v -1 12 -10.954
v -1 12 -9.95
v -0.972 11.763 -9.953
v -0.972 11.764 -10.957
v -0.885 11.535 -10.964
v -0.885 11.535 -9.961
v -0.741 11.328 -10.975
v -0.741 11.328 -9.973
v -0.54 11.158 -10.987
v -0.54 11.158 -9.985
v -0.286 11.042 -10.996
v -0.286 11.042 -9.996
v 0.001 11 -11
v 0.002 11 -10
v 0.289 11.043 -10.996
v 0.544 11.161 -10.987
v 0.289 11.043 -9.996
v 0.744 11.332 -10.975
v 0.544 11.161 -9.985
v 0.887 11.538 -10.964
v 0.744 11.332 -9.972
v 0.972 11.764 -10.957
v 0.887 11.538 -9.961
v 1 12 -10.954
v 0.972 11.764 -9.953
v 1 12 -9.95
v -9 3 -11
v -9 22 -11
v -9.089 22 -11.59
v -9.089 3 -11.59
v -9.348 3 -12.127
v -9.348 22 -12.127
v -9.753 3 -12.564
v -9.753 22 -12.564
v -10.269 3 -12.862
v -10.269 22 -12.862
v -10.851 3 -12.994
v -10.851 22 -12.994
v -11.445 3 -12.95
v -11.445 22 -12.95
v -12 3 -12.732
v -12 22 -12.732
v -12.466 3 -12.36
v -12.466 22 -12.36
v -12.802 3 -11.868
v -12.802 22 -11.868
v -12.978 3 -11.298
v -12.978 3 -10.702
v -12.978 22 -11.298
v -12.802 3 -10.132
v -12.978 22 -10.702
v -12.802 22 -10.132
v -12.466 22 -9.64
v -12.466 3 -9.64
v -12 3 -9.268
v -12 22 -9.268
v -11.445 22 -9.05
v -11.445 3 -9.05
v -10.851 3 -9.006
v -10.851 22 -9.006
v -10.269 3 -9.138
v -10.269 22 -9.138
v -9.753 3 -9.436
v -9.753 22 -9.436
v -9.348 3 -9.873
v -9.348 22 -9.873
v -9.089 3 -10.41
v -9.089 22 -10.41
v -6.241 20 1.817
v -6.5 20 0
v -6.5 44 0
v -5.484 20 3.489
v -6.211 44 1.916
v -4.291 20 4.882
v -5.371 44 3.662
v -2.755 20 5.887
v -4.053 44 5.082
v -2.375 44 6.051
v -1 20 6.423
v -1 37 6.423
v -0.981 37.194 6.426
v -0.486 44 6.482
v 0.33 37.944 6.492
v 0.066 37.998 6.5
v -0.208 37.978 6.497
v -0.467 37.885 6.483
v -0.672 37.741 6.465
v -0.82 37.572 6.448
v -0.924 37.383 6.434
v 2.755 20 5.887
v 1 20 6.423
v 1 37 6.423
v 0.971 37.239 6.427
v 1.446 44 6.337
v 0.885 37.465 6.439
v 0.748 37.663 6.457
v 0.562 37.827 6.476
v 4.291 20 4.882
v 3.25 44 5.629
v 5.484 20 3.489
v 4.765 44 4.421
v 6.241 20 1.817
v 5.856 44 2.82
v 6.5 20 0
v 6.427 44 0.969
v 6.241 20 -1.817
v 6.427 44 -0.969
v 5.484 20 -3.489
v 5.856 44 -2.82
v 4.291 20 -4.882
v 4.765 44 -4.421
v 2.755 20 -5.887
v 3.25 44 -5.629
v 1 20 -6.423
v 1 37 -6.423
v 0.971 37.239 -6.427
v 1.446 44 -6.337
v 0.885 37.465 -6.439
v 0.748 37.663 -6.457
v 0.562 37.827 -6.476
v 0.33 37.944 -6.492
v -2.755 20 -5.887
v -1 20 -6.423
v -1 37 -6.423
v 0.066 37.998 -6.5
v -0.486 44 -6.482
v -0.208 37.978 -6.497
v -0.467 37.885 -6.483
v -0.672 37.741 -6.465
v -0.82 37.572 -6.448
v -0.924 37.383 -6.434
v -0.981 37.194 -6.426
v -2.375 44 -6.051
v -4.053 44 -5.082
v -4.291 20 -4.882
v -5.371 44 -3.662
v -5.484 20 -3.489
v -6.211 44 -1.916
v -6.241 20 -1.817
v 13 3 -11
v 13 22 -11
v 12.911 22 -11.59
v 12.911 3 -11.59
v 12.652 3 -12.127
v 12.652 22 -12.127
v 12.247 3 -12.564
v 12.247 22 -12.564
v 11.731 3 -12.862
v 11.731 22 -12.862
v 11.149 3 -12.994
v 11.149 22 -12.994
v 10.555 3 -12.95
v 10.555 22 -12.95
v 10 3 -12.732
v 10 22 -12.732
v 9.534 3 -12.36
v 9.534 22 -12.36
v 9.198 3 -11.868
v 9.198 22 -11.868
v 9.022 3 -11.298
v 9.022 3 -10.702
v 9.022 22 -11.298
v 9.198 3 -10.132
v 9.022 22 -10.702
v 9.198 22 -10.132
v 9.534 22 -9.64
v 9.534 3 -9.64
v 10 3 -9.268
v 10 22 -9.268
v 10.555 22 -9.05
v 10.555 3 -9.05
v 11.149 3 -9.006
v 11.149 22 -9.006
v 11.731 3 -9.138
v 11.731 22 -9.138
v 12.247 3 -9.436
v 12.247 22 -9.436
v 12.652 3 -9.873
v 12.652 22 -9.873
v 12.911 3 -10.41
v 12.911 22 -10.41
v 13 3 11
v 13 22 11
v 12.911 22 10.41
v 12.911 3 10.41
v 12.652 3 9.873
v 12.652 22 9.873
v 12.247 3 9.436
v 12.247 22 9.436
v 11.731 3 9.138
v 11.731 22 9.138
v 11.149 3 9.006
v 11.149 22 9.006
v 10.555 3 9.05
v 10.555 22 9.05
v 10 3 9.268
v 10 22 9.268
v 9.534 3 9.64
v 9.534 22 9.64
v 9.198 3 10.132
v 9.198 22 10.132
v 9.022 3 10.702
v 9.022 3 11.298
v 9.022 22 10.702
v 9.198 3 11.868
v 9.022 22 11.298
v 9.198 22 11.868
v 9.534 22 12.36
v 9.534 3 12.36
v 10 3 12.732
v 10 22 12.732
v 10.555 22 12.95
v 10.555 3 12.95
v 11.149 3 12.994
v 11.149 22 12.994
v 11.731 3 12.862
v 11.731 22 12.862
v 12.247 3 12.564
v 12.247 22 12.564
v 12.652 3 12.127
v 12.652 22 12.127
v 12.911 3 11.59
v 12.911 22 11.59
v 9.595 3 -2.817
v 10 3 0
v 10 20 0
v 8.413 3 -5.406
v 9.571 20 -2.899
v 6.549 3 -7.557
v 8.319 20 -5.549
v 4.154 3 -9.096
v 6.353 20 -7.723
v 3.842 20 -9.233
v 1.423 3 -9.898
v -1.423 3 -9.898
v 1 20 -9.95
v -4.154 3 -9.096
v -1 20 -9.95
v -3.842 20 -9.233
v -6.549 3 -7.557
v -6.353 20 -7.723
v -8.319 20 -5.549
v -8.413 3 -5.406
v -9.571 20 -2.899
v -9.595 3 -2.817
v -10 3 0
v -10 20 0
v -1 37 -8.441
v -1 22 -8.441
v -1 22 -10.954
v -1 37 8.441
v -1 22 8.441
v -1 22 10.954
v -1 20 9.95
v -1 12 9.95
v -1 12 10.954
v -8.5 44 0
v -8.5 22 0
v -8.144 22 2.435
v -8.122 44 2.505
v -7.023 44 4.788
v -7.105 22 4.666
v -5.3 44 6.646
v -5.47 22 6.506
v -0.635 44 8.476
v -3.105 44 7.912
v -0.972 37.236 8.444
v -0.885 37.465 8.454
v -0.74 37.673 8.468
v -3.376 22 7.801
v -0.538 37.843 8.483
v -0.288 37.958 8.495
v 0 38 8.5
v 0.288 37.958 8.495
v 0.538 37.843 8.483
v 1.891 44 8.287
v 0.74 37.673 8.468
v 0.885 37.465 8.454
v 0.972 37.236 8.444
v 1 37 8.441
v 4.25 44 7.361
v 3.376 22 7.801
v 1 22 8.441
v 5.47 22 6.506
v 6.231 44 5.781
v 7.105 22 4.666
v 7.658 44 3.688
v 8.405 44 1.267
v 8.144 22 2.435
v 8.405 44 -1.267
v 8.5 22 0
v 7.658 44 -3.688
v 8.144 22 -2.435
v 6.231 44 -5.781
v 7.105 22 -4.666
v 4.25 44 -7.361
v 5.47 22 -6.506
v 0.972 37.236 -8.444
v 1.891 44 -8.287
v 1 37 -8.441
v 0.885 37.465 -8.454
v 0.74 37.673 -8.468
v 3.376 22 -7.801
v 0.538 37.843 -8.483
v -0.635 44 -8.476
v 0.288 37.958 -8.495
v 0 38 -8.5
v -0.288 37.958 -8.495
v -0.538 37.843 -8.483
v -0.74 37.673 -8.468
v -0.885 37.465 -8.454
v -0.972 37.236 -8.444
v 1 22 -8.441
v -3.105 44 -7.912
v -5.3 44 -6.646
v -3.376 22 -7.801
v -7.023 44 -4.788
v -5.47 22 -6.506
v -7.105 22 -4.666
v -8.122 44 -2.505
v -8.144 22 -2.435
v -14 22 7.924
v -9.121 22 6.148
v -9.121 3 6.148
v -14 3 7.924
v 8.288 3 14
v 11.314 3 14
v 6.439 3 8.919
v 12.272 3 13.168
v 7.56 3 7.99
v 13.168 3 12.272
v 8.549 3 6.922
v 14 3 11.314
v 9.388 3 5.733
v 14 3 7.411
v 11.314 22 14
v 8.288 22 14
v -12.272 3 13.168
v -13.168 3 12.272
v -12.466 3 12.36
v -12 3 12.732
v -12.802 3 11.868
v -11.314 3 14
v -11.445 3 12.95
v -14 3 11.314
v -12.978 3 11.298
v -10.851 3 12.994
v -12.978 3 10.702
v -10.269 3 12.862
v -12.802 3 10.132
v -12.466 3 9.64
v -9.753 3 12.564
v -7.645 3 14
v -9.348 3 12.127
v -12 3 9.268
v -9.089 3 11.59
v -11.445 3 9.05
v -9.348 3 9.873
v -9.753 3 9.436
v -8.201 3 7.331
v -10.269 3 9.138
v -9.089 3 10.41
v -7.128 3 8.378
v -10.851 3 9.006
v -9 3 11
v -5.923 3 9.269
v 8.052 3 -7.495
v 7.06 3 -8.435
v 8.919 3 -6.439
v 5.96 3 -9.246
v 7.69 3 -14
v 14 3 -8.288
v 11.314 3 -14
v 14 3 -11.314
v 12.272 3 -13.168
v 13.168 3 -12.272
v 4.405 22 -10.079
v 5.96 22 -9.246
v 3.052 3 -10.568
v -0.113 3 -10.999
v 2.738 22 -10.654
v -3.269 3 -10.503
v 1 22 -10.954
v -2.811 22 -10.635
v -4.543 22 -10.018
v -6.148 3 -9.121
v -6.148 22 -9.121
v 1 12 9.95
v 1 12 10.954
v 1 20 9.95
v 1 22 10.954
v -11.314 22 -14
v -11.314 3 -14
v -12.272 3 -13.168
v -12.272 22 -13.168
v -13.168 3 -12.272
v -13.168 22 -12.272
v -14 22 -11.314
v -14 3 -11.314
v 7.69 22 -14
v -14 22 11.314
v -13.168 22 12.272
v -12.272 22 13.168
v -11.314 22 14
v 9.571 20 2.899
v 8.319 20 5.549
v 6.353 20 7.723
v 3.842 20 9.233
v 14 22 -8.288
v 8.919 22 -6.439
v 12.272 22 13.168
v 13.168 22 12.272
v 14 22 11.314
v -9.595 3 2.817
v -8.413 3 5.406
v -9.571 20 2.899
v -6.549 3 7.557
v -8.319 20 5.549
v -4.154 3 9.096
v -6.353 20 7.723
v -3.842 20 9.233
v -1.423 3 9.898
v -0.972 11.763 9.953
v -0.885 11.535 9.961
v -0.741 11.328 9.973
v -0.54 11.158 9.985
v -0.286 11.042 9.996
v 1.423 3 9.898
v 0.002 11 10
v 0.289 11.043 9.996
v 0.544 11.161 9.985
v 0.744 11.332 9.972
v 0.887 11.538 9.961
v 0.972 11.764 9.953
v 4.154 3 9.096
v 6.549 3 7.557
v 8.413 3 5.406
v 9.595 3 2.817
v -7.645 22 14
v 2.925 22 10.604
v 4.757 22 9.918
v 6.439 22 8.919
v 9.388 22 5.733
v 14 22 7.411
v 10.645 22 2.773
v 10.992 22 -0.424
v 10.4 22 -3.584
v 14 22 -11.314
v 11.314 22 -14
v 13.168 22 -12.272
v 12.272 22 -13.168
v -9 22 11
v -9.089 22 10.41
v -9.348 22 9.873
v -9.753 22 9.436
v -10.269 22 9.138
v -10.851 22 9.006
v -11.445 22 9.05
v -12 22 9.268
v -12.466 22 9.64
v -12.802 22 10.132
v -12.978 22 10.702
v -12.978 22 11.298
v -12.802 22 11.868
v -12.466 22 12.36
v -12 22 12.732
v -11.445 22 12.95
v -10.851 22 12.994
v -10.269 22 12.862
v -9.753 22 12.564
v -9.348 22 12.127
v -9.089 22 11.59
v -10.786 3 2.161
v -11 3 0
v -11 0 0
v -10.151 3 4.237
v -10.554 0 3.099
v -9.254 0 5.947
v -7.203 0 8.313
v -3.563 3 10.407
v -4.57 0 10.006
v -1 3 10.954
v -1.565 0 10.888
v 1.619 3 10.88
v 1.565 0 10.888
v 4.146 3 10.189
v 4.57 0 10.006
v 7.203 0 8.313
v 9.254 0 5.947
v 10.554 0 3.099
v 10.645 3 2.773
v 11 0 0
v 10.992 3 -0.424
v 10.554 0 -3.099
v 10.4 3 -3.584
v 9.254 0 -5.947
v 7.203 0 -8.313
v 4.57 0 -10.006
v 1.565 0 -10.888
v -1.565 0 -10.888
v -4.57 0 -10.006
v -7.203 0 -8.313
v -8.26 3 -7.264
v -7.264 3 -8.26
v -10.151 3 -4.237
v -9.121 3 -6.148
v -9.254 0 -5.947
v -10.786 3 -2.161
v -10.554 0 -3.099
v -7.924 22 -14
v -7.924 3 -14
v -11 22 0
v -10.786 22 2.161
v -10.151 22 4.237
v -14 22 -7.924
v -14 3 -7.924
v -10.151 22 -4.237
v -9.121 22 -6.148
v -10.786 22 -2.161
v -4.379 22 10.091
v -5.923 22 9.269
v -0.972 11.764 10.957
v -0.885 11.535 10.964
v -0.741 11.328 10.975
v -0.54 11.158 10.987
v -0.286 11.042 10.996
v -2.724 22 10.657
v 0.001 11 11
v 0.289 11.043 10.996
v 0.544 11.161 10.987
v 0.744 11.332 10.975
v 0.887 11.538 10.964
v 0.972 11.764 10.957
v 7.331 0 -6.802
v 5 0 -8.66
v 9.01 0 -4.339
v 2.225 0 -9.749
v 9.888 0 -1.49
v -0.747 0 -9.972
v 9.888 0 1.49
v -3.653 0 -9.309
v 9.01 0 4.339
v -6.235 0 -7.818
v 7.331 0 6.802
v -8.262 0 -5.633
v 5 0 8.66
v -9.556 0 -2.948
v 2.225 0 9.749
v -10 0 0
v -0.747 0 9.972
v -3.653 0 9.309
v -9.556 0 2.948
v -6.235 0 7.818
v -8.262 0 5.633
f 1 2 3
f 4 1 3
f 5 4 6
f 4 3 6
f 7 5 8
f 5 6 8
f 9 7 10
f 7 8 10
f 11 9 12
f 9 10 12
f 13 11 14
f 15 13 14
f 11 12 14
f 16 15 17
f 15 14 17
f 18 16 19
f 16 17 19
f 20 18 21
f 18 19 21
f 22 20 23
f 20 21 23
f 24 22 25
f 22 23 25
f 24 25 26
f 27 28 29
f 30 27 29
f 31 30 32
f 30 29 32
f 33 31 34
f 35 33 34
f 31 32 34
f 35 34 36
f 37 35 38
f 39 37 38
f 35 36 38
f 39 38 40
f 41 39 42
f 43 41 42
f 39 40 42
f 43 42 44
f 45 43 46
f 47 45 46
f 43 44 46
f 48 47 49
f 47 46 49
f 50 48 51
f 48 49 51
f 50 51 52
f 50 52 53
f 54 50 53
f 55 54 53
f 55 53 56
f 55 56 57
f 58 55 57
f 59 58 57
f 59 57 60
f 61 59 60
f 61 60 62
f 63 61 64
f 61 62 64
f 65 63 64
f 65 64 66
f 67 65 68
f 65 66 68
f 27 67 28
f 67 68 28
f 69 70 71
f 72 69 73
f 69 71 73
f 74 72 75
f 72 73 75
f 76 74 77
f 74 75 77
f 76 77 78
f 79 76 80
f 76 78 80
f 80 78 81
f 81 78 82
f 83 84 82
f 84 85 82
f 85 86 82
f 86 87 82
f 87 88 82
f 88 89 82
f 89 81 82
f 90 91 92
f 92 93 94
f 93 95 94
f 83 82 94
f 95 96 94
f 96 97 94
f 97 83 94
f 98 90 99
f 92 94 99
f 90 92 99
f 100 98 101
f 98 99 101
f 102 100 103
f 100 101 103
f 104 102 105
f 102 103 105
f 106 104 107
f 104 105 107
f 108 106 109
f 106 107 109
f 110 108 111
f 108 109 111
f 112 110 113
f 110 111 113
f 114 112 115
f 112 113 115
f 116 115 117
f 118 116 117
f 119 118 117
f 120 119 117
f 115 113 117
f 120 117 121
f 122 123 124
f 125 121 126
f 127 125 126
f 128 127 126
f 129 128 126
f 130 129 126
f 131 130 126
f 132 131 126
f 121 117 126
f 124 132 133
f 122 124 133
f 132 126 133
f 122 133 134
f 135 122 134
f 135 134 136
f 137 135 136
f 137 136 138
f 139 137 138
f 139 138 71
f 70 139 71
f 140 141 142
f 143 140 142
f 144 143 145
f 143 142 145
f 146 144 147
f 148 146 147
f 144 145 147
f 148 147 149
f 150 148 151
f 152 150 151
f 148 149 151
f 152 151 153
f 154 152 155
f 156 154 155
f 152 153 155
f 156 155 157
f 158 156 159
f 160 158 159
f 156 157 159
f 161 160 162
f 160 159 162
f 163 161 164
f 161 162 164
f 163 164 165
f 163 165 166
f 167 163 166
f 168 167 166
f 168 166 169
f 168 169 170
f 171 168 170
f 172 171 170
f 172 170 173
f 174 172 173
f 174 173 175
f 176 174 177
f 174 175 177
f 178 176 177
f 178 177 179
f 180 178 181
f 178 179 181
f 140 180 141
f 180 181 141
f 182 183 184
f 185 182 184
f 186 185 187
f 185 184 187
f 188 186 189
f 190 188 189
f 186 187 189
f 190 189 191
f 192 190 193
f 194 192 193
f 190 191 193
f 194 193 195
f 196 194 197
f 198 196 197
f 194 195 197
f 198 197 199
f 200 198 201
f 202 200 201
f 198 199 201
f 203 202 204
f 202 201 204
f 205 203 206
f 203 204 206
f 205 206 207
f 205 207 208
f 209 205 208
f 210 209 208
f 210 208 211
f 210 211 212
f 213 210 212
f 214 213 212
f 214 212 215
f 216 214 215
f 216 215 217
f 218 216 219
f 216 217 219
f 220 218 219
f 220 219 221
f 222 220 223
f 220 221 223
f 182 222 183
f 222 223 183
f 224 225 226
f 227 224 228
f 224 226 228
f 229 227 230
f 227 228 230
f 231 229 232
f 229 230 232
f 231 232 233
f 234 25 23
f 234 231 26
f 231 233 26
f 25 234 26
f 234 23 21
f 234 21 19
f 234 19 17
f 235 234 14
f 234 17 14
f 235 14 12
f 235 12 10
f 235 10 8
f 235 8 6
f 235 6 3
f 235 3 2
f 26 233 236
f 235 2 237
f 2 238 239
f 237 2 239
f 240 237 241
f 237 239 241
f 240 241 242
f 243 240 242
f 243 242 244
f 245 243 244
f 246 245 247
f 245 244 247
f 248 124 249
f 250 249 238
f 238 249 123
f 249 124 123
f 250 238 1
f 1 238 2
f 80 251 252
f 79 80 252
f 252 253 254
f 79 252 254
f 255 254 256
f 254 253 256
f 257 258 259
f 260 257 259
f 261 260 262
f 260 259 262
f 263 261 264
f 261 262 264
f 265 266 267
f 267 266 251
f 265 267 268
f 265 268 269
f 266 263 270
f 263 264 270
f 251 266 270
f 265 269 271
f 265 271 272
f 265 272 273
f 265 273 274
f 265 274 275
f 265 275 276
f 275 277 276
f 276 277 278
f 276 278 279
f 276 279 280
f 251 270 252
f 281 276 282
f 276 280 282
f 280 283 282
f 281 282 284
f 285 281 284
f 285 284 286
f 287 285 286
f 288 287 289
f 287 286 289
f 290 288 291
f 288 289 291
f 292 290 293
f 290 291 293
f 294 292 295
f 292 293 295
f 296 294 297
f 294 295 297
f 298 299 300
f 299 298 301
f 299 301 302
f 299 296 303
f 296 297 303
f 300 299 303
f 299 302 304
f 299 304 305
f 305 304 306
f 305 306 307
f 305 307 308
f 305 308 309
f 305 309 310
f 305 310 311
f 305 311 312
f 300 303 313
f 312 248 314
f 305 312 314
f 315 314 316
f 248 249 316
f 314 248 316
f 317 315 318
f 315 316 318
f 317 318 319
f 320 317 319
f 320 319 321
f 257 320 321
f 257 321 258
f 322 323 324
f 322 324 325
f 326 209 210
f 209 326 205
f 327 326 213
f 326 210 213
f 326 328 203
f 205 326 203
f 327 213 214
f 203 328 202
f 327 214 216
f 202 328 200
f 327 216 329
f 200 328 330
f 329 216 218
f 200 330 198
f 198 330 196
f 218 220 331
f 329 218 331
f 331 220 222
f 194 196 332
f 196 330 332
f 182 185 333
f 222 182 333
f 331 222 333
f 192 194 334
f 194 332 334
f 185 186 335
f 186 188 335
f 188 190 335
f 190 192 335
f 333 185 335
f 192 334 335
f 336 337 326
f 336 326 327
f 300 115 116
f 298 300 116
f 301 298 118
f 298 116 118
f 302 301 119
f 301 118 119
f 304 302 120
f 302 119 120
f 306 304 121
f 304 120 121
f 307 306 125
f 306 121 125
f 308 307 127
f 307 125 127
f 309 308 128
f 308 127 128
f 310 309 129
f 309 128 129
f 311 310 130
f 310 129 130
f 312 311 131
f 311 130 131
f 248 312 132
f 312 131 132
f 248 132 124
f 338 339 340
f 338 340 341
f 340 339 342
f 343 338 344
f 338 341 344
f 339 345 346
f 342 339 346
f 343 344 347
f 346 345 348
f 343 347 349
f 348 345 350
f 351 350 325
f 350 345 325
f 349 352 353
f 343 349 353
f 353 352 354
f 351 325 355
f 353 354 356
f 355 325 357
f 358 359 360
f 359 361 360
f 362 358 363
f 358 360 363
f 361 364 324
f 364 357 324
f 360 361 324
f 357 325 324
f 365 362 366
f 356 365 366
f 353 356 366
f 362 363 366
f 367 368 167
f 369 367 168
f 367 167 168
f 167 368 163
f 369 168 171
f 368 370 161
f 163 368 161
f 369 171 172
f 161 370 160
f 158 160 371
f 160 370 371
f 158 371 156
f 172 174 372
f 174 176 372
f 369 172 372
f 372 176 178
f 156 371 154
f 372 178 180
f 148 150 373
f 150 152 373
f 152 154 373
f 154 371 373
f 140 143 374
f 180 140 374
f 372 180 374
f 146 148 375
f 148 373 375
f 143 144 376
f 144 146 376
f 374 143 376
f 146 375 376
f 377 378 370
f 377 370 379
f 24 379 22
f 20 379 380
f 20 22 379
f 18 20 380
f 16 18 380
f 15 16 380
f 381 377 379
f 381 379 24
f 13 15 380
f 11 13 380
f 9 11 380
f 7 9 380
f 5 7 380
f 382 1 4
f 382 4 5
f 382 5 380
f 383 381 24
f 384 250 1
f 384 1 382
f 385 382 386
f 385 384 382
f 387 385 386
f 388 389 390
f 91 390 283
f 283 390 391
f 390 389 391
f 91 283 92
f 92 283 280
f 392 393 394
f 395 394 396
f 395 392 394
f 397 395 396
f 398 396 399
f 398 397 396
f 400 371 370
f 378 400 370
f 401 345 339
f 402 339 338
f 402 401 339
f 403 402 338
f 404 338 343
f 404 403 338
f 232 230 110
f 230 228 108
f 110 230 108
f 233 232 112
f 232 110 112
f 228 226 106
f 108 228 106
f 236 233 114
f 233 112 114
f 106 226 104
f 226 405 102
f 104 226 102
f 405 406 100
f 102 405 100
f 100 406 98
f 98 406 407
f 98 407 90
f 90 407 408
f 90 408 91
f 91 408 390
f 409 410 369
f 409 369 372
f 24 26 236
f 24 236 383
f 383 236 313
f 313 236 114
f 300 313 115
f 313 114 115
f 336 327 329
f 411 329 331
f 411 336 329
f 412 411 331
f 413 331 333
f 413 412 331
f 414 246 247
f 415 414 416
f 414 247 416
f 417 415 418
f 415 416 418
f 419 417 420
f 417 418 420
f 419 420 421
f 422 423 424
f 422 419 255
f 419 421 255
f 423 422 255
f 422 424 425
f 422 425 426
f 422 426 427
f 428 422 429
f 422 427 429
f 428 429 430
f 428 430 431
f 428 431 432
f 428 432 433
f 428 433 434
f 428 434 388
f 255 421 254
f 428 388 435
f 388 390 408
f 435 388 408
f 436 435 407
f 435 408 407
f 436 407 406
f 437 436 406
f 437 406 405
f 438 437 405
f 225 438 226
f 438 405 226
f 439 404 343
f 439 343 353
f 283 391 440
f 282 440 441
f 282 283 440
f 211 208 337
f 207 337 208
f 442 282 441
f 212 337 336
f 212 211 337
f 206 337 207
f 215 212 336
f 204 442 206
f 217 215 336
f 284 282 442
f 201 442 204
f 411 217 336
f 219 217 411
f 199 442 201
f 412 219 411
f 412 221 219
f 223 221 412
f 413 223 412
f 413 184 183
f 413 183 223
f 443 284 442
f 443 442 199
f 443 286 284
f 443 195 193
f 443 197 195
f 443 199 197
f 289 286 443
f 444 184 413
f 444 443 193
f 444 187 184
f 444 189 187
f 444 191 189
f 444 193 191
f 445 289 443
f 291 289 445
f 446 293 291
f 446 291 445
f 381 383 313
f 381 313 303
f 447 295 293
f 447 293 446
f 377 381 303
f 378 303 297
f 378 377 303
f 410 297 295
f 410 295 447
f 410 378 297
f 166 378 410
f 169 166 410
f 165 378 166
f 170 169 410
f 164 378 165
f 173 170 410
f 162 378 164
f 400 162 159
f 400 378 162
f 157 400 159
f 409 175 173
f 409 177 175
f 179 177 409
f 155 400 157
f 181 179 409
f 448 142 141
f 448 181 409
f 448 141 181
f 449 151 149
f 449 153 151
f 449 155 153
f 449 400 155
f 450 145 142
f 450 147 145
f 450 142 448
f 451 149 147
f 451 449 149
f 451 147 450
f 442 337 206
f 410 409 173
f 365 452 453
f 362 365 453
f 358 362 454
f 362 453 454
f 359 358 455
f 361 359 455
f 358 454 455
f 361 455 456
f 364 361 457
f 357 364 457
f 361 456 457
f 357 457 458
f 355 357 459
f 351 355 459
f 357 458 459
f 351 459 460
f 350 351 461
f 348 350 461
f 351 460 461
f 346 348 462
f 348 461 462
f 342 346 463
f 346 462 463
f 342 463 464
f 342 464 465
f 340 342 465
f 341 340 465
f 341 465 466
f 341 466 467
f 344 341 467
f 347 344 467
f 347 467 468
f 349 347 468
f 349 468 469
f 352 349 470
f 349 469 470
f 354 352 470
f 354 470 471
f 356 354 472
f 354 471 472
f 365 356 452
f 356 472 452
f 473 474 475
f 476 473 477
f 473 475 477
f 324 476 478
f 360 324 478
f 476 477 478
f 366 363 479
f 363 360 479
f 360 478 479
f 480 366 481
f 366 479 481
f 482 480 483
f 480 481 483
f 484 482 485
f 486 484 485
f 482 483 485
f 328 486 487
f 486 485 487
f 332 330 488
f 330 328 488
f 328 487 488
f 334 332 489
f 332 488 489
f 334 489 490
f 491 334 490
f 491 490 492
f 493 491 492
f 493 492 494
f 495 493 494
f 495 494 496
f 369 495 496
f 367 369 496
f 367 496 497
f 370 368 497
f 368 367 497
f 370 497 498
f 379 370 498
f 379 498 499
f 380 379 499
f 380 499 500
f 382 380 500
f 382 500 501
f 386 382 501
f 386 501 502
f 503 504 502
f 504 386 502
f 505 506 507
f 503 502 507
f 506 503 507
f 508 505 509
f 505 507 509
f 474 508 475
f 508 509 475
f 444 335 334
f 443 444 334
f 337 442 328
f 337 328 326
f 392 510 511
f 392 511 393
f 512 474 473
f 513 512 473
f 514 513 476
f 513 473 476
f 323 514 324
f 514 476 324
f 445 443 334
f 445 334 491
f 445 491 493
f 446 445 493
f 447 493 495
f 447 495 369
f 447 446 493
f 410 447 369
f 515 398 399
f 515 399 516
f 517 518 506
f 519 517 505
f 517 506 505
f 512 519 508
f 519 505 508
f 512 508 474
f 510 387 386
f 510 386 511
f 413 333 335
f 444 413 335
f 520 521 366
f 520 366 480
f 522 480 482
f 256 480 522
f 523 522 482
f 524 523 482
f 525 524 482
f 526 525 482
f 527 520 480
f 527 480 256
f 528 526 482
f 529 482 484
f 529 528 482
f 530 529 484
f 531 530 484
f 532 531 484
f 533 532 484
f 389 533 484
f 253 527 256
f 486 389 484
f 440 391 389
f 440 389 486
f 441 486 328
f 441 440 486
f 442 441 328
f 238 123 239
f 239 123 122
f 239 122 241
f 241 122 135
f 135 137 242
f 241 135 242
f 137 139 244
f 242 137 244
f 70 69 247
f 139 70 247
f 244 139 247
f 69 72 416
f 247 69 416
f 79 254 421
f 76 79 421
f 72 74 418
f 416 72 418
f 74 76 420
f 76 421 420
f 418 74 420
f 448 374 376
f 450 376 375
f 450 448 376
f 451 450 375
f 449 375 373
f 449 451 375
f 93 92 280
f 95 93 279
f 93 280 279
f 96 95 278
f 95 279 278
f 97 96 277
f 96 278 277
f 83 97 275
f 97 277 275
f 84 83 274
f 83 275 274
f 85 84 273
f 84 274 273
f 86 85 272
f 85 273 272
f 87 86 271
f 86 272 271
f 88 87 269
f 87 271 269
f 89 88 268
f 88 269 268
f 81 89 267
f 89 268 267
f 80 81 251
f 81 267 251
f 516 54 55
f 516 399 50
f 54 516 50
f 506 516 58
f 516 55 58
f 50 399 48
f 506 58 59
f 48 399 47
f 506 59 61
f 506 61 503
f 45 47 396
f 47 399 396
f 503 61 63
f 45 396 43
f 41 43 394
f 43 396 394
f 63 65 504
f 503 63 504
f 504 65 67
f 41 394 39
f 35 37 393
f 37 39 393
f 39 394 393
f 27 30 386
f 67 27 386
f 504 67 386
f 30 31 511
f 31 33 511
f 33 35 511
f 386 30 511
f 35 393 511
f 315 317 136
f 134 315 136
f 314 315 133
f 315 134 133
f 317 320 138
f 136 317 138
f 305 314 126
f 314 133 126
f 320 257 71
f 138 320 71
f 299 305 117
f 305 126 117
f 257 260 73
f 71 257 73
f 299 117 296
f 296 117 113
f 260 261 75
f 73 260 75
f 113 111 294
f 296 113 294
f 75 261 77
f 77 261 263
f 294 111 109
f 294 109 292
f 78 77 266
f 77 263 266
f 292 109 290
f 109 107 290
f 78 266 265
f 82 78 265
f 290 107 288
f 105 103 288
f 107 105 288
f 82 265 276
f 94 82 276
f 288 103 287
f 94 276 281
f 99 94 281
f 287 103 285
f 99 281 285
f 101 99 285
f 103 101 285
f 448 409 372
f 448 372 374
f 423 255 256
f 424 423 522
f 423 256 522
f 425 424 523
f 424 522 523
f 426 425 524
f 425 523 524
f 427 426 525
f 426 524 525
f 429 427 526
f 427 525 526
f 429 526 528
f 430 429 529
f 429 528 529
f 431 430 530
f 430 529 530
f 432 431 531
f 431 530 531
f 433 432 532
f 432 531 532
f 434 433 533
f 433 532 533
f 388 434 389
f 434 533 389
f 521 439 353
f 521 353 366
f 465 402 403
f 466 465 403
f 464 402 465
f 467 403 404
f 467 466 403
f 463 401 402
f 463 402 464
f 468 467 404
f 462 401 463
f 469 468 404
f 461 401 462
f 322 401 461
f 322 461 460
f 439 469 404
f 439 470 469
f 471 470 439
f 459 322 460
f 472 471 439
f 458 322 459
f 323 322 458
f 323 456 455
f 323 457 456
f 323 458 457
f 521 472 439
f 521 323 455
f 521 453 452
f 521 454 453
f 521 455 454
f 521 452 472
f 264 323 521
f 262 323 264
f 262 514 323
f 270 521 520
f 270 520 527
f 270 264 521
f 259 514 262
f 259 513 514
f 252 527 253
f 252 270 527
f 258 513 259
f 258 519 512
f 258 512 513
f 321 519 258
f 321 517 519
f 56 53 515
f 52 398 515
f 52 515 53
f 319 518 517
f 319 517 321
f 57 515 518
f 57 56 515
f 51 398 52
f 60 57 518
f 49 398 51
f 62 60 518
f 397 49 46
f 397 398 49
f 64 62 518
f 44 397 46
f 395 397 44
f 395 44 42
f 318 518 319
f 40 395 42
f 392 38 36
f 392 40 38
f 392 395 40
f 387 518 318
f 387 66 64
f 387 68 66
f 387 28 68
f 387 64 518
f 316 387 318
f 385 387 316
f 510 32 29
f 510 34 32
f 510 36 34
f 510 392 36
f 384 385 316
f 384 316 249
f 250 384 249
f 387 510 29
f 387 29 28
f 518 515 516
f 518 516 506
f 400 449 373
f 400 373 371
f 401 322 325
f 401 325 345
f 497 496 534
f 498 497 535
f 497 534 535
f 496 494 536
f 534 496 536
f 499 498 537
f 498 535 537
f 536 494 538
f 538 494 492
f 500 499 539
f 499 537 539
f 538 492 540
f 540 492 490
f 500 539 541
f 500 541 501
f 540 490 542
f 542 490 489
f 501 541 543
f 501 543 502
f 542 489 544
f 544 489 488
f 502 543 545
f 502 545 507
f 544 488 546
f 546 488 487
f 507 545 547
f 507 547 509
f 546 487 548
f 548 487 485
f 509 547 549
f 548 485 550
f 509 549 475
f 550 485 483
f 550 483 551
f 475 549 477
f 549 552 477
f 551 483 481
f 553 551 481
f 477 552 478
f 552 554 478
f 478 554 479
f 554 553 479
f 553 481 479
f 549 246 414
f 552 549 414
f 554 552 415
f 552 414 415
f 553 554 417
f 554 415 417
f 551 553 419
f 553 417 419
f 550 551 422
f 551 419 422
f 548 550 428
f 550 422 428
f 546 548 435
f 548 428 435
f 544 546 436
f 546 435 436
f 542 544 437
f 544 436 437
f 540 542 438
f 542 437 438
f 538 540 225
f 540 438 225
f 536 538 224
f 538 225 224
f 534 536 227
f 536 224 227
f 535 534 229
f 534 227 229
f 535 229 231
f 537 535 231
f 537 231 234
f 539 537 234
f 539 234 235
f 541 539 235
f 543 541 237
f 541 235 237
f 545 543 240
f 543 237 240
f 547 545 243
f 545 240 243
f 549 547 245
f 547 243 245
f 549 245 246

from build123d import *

# Parameters (mm, degrees)
ESQUISSE3_R      = 2
ESQUISSE3_R_2    = 10
EXTRUSION2_DEPTH = 19
EXTRUSION4_DEPTH = 29


with BuildPart() as part:
    # Esquisse1 → Révolution1 (revolve)
    with BuildSketch(Plane.XY):
        Polygon((-6.5, 20), (-6.5, 44), (-8.5, 44), (-8.5, 22), (-11, 22), (-11, 0), (-10, 0), (-10, 20), align=None)
    revolve(axis=Axis((0, 0, 0), (0, 1, 0)))

    # Esquisse3 → Extrusion2 (add)
    with BuildSketch(Plane(origin=(0, 22, 0), x_dir=(1, 0, 0), z_dir=(0, 1, 0))):
        with BuildLine():
            Line((-11.313708499, -14), (-7.645328987, -14))
            Line((-7.645328987, -14), (-5.923372103, -9.268962344))
            ThreePointArc((-5.923372103, -9.268962344), (0.311535181, -10.995587562), (6.438678833, -8.918711504))
            Line((6.438678833, -8.918711504), (8.288116597, -14))
            Line((8.288116597, -14), (11.313708499, -14))
            ThreePointArc((11.313708499, -14), (12.727922061, -12.727922061), (14, -11.313708499))
            Line((14, -11.313708499), (14, -7.411373431))
            Line((14, -7.411373431), (9.388048674, -5.732760426))
            ThreePointArc((9.388048674, -5.732760426), (10.991831078, 0.423850851), (8.918711504, 6.438678833))
            Line((8.918711504, 6.438678833), (14, 8.288116597))
            Line((14, 8.288116597), (14, 11.313708499))
            ThreePointArc((14, 11.313708499), (12.727922061, 12.727922061), (11.313708499, 14))
            Line((11.313708499, 14), (7.690190806, 14))
            Line((7.690190806, 14), (5.959738542, 9.245621478))
            ThreePointArc((5.959738542, 9.245621478), (-0.112996861, 10.999419608), (-6.148420959, 9.12123455))
            Line((-6.148420959, 9.12123455), (-7.924146363, 14))
            Line((-7.924146363, 14), (-11.313708499, 14))
            ThreePointArc((-11.313708499, 14), (-12.727922061, 12.727922061), (-14, 11.313708499))
            Line((-14, 11.313708499), (-14, 7.924146363))
            Line((-14, 7.924146363), (-9.12123455, 6.148420959))
            ThreePointArc((-9.12123455, 6.148420959), (-11, 0), (-9.12123455, -6.148420959))
            Line((-9.12123455, -6.148420959), (-14, -7.924146363))
            Line((-14, -7.924146363), (-14, -11.313708499))
            ThreePointArc((-14, -11.313708499), (-12.727922061, -12.727922061), (-11.313708499, -14))
        make_face()
        with Locations((11, 11)):
            Circle(ESQUISSE3_R, mode=Mode.SUBTRACT)
        with Locations((-11, -11)):
            Circle(ESQUISSE3_R, mode=Mode.SUBTRACT)
        with Locations((-11, 11)):
            Circle(ESQUISSE3_R, mode=Mode.SUBTRACT)
        with Locations((11, -11)):
            Circle(ESQUISSE3_R, mode=Mode.SUBTRACT)
        Circle(ESQUISSE3_R_2, mode=Mode.SUBTRACT)
    extrude(amount=-EXTRUSION2_DEPTH)

    # Esquisse4 → Extrusion4 (cut, through all)
    with BuildSketch(Plane.XY.offset(14)):
        with BuildLine():
            Line((-1, 37), (-1, 12))
            ThreePointArc((-1, 12), (0, 11), (1, 12))
            Line((1, 12), (1, 37))
            ThreePointArc((1, 37), (0, 38), (-1, 37))
        make_face()
    extrude(amount=-EXTRUSION4_DEPTH, mode=Mode.SUBTRACT)


solid = part.part
